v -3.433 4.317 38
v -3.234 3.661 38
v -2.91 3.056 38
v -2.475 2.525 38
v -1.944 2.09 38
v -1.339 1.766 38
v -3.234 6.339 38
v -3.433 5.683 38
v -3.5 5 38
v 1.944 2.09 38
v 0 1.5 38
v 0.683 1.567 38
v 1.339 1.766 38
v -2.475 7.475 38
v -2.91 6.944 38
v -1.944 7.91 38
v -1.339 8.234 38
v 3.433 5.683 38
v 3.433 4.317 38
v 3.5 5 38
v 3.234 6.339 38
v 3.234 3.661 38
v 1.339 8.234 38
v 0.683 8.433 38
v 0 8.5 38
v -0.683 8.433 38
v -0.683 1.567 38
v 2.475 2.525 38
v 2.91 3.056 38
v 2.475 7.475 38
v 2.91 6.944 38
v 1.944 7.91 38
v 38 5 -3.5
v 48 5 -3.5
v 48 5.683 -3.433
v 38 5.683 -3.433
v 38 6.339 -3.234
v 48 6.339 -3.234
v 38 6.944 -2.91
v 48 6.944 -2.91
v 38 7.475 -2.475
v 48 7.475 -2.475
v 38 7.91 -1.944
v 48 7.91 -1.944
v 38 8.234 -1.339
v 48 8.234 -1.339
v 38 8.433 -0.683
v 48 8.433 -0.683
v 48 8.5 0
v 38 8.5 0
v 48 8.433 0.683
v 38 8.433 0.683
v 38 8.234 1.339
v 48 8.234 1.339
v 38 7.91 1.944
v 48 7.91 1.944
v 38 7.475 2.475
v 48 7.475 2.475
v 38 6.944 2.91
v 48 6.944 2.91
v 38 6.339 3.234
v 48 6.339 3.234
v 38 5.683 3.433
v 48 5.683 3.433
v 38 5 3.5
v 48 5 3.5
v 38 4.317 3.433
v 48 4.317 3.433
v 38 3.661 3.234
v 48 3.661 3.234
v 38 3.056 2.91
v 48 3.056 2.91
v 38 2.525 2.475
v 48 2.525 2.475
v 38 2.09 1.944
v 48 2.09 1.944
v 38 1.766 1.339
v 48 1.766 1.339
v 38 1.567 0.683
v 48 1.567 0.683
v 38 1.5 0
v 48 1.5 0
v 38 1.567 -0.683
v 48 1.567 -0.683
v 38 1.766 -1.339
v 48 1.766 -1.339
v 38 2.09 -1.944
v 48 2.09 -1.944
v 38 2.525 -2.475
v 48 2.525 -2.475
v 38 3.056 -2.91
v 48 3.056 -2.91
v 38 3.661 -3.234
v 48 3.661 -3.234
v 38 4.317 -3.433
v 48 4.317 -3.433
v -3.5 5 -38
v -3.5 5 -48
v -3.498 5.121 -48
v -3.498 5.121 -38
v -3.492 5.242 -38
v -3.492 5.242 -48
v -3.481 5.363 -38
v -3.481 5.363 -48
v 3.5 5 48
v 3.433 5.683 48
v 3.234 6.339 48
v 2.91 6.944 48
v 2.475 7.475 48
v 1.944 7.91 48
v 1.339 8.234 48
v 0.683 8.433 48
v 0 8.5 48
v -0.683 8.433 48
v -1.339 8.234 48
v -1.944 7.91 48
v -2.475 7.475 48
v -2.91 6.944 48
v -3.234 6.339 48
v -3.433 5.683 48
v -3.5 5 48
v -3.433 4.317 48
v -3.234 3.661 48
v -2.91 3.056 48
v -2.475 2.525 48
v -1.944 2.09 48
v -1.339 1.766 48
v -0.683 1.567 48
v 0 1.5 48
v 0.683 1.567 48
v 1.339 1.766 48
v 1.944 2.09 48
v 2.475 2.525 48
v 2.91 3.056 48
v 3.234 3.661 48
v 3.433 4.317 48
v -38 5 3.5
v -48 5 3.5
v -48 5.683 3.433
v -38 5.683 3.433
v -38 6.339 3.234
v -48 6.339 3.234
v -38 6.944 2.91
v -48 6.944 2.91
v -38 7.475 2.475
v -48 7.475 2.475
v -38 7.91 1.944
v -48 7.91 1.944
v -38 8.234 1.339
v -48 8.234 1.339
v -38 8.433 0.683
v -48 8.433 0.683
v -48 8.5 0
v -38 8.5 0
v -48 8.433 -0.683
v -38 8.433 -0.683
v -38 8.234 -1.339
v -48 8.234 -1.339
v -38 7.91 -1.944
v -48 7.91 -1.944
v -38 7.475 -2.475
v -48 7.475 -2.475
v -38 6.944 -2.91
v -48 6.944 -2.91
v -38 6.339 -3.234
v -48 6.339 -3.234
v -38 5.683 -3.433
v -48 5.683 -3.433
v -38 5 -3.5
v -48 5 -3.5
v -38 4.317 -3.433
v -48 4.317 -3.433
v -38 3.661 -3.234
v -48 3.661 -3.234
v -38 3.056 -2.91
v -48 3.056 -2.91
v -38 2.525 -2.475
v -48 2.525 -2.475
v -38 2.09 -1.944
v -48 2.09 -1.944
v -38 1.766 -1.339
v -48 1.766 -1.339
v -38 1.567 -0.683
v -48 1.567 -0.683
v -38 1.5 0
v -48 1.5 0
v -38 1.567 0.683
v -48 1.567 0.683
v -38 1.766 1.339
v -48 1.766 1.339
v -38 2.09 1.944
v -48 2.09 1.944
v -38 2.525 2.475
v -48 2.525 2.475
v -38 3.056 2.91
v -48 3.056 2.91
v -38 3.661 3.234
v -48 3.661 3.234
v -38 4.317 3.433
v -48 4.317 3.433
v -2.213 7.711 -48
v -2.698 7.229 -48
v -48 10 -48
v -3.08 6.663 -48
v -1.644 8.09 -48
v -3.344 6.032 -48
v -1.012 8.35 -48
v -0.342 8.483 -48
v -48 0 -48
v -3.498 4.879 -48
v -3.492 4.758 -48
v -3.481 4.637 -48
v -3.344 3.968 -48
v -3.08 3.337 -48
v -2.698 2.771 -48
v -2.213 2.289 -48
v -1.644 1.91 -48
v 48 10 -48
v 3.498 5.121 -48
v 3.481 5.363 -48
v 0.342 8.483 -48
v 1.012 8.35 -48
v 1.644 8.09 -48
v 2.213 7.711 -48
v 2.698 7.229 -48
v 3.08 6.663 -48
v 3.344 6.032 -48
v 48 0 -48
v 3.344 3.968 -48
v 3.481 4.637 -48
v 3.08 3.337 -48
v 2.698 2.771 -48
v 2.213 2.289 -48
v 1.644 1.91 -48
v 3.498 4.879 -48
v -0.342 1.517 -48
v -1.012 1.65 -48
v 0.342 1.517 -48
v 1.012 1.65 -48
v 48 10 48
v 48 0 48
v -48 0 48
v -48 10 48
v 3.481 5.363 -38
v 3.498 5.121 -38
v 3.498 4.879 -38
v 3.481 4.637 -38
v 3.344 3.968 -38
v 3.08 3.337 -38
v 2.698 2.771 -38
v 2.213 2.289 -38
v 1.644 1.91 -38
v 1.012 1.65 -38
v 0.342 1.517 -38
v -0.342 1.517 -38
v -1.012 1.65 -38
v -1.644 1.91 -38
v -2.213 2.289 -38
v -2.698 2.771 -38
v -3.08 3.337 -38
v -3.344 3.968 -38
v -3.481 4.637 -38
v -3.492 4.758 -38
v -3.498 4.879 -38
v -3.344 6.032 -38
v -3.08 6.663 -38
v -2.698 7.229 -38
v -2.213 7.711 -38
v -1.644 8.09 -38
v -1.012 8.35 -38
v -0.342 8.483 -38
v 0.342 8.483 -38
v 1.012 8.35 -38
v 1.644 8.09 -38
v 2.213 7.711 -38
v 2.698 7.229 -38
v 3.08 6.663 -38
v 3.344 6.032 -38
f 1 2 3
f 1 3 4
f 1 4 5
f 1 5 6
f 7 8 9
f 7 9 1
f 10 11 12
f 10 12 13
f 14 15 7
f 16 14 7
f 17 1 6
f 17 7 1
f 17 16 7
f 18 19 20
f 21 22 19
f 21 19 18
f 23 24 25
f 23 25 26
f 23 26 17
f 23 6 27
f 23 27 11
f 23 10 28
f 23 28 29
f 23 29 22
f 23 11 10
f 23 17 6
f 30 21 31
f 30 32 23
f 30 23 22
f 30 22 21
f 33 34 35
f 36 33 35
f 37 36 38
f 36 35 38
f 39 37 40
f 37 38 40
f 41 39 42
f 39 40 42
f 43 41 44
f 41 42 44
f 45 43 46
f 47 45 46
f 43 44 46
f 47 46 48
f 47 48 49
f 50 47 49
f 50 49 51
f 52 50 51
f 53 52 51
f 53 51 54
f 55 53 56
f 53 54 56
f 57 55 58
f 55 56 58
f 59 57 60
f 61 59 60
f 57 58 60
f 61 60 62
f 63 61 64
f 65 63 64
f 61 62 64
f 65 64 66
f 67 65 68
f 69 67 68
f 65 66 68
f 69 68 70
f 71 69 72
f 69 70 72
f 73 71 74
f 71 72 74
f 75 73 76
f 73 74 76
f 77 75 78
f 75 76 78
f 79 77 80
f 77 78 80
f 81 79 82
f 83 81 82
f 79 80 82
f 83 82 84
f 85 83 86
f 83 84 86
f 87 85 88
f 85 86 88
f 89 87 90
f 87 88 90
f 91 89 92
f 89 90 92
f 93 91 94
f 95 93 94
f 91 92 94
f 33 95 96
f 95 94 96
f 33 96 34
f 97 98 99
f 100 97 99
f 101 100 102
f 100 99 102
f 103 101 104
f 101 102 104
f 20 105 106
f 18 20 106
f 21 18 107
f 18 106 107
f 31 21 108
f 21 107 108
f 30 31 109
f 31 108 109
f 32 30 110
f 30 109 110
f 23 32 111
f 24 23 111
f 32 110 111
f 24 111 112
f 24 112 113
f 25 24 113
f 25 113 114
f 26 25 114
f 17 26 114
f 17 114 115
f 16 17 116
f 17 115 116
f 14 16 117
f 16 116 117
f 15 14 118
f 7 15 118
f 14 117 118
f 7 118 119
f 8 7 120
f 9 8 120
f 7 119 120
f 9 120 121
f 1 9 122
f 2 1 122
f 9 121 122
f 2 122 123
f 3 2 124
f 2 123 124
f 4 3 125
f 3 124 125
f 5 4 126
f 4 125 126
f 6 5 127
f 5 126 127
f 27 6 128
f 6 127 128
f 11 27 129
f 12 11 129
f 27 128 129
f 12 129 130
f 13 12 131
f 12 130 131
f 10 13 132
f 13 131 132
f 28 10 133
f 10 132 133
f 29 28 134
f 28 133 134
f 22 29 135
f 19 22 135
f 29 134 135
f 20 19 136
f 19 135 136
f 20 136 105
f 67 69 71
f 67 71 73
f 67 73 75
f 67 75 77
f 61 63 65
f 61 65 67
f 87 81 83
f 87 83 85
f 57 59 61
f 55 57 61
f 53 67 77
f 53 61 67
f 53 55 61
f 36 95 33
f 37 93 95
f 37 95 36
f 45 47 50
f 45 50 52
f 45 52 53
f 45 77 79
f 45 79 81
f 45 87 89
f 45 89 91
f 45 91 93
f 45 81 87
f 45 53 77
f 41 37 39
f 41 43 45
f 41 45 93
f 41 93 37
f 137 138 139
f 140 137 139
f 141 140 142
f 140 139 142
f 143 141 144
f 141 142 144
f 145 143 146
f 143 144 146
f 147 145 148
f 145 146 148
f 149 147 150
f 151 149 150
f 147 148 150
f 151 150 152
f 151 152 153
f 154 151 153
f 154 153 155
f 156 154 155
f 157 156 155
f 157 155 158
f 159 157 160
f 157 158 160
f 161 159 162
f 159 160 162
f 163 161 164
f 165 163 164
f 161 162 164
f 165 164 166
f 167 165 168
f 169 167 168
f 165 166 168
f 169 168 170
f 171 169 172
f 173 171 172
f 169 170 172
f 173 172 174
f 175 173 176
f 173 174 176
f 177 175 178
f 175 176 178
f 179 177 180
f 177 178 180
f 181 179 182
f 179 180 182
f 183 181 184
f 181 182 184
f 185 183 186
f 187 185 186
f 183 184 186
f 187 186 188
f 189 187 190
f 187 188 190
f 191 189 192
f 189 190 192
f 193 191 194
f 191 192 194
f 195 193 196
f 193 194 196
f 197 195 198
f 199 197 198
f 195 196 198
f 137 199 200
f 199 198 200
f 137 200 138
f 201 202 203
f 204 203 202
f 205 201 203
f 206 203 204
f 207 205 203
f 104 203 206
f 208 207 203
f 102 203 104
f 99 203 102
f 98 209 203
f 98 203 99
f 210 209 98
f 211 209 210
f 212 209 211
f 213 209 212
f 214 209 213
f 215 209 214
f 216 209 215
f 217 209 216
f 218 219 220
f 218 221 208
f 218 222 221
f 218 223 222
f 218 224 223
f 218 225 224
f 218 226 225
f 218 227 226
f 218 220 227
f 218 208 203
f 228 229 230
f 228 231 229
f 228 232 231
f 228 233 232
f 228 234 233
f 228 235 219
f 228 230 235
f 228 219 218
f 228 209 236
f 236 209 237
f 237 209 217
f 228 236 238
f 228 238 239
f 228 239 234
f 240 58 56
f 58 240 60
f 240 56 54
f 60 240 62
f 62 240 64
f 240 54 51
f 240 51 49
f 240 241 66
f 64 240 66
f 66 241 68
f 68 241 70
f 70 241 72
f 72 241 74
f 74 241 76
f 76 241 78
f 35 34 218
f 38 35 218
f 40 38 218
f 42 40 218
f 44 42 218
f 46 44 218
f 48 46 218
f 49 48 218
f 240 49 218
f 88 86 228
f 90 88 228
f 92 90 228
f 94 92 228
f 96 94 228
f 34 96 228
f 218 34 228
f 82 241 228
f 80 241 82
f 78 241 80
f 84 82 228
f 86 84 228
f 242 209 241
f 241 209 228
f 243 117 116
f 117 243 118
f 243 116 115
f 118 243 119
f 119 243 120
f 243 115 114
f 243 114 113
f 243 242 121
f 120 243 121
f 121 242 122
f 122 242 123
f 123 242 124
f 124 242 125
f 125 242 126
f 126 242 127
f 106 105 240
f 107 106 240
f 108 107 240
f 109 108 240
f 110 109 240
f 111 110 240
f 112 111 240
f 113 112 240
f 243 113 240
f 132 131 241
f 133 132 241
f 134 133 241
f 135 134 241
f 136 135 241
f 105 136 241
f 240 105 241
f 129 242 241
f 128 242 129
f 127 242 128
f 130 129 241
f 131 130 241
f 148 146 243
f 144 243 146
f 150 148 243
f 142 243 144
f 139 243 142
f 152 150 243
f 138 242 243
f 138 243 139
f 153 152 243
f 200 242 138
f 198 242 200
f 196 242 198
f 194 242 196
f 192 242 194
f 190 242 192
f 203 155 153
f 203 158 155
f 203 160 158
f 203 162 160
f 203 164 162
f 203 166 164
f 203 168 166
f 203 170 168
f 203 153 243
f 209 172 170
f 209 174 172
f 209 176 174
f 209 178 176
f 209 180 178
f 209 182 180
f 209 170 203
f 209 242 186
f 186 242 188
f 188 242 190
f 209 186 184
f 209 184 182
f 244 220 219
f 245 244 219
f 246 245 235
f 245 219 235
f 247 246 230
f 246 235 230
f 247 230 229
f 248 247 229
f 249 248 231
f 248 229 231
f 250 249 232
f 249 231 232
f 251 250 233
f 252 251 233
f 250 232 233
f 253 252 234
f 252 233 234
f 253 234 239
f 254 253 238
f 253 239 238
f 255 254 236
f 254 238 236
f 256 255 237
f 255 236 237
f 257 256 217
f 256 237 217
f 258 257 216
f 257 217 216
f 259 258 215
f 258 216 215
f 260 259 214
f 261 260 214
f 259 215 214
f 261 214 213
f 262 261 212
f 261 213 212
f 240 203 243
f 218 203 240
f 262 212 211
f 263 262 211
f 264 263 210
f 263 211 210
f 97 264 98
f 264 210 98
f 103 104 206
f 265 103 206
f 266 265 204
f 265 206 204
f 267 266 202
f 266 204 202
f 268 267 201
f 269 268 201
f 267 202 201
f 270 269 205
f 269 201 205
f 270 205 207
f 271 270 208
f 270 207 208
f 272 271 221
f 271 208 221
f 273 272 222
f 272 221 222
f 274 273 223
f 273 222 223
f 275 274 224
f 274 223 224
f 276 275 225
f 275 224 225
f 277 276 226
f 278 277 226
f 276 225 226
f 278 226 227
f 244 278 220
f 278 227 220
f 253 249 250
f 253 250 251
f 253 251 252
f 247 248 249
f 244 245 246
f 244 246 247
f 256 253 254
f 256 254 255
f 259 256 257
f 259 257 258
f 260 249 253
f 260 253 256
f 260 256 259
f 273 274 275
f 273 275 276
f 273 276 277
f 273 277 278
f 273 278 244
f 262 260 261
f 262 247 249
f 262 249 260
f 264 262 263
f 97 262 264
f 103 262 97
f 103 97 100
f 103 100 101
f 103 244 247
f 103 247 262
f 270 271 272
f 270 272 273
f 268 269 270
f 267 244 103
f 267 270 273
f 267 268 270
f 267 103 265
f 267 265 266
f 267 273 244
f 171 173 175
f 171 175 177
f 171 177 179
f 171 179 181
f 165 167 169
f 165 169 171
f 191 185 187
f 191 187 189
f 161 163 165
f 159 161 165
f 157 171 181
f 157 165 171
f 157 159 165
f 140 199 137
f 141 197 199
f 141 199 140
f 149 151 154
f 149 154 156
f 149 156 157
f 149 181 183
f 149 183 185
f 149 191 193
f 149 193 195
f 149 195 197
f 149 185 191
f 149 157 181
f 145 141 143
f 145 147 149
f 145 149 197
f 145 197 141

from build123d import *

# Parameters (mm, degrees)
SKETCH_1_W          = 96
SKETCH_1_H          = 96
EXTRUDE_1_DEPTH     = 10
SKETCH_2_R          = 3.5
CUT_EXTRUDE_1_DEPTH = 10
SKETCH_3_R          = 3.5
CUT_EXTRUDE_2_DEPTH = 10
CUT_EXTRUDE_3_DEPTH = 10
SKETCH_5_R          = 3.5
CUT_EXTRUDE_4_DEPTH = 10


with BuildPart() as part:
    # 草图1 → 凸台-拉伸1 (new body)
    with BuildSketch(Plane(origin=(0, 0, 0), x_dir=(1, 0, 0), z_dir=(0, 1, 0))):
        Rectangle(SKETCH_1_W, SKETCH_1_H)
    extrude(amount=EXTRUDE_1_DEPTH)

    # 草图2 → 切除-拉伸1 (cut)
    with BuildSketch(Plane.XY.offset(48)):
        with Locations((0, 5)):
            Circle(SKETCH_2_R)
    extrude(amount=-CUT_EXTRUDE_1_DEPTH, mode=Mode.SUBTRACT)

    # 草图3 → 切除-拉伸2 (cut)
    with BuildSketch(Plane(origin=(48, 0, 0), x_dir=(0, 0, -1), z_dir=(1, 0, 0))):
        with Locations((0, 5)):
            Circle(SKETCH_3_R)
    extrude(amount=-CUT_EXTRUDE_2_DEPTH, mode=Mode.SUBTRACT)

    # 草图4 → 切除-拉伸3 (cut)
    with BuildSketch(Plane(origin=(0, 0, -48), x_dir=(-1, 0, 0), z_dir=(0, 0, -1))):
        with BuildLine():
            ThreePointArc((3.481164431, 5.362621295), (0, 8.5), (-3.481164431, 5.362621295))
            Line((-3.481164431, 5.362621295), (0, 5))
            Line((0, 5), (3.481164431, 5.362621295))
        make_face()
        with BuildLine():
            Line((0, 5), (-3.481164431, 5.362621295))
            ThreePointArc((-3.481164431, 5.362621295), (-3.5, 5), (-3.481164431, 4.637378705))
            Line((-3.481164431, 4.637378705), (0, 5))
        make_face()
        with BuildLine():
            Line((3.481164431, 5.362621295), (0, 5))
            Line((0, 5), (3.481164431, 4.637378705))
            ThreePointArc((3.481164431, 4.637378705), (3.495287936, 4.818444924), (3.5, 5))
            ThreePointArc((3.5, 5), (3.495287936, 5.181555076), (3.481164431, 5.362621295))
        make_face()
        with BuildLine():
            Line((3.481164431, 4.637378705), (0, 5))
            Line((0, 5), (-3.481164431, 4.637378705))
            ThreePointArc((-3.481164431, 4.637378705), (0, 1.5), (3.481164431, 4.637378705))
        make_face()
    extrude(amount=-CUT_EXTRUDE_3_DEPTH, mode=Mode.SUBTRACT)

    # 草图5 → 切除-拉伸4 (cut)
    with BuildSketch(Plane.ZY.offset(48)):
        with Locations((0, 5)):
            Circle(SKETCH_5_R)
    extrude(amount=-CUT_EXTRUDE_4_DEPTH, mode=Mode.SUBTRACT)


solid = part.part
